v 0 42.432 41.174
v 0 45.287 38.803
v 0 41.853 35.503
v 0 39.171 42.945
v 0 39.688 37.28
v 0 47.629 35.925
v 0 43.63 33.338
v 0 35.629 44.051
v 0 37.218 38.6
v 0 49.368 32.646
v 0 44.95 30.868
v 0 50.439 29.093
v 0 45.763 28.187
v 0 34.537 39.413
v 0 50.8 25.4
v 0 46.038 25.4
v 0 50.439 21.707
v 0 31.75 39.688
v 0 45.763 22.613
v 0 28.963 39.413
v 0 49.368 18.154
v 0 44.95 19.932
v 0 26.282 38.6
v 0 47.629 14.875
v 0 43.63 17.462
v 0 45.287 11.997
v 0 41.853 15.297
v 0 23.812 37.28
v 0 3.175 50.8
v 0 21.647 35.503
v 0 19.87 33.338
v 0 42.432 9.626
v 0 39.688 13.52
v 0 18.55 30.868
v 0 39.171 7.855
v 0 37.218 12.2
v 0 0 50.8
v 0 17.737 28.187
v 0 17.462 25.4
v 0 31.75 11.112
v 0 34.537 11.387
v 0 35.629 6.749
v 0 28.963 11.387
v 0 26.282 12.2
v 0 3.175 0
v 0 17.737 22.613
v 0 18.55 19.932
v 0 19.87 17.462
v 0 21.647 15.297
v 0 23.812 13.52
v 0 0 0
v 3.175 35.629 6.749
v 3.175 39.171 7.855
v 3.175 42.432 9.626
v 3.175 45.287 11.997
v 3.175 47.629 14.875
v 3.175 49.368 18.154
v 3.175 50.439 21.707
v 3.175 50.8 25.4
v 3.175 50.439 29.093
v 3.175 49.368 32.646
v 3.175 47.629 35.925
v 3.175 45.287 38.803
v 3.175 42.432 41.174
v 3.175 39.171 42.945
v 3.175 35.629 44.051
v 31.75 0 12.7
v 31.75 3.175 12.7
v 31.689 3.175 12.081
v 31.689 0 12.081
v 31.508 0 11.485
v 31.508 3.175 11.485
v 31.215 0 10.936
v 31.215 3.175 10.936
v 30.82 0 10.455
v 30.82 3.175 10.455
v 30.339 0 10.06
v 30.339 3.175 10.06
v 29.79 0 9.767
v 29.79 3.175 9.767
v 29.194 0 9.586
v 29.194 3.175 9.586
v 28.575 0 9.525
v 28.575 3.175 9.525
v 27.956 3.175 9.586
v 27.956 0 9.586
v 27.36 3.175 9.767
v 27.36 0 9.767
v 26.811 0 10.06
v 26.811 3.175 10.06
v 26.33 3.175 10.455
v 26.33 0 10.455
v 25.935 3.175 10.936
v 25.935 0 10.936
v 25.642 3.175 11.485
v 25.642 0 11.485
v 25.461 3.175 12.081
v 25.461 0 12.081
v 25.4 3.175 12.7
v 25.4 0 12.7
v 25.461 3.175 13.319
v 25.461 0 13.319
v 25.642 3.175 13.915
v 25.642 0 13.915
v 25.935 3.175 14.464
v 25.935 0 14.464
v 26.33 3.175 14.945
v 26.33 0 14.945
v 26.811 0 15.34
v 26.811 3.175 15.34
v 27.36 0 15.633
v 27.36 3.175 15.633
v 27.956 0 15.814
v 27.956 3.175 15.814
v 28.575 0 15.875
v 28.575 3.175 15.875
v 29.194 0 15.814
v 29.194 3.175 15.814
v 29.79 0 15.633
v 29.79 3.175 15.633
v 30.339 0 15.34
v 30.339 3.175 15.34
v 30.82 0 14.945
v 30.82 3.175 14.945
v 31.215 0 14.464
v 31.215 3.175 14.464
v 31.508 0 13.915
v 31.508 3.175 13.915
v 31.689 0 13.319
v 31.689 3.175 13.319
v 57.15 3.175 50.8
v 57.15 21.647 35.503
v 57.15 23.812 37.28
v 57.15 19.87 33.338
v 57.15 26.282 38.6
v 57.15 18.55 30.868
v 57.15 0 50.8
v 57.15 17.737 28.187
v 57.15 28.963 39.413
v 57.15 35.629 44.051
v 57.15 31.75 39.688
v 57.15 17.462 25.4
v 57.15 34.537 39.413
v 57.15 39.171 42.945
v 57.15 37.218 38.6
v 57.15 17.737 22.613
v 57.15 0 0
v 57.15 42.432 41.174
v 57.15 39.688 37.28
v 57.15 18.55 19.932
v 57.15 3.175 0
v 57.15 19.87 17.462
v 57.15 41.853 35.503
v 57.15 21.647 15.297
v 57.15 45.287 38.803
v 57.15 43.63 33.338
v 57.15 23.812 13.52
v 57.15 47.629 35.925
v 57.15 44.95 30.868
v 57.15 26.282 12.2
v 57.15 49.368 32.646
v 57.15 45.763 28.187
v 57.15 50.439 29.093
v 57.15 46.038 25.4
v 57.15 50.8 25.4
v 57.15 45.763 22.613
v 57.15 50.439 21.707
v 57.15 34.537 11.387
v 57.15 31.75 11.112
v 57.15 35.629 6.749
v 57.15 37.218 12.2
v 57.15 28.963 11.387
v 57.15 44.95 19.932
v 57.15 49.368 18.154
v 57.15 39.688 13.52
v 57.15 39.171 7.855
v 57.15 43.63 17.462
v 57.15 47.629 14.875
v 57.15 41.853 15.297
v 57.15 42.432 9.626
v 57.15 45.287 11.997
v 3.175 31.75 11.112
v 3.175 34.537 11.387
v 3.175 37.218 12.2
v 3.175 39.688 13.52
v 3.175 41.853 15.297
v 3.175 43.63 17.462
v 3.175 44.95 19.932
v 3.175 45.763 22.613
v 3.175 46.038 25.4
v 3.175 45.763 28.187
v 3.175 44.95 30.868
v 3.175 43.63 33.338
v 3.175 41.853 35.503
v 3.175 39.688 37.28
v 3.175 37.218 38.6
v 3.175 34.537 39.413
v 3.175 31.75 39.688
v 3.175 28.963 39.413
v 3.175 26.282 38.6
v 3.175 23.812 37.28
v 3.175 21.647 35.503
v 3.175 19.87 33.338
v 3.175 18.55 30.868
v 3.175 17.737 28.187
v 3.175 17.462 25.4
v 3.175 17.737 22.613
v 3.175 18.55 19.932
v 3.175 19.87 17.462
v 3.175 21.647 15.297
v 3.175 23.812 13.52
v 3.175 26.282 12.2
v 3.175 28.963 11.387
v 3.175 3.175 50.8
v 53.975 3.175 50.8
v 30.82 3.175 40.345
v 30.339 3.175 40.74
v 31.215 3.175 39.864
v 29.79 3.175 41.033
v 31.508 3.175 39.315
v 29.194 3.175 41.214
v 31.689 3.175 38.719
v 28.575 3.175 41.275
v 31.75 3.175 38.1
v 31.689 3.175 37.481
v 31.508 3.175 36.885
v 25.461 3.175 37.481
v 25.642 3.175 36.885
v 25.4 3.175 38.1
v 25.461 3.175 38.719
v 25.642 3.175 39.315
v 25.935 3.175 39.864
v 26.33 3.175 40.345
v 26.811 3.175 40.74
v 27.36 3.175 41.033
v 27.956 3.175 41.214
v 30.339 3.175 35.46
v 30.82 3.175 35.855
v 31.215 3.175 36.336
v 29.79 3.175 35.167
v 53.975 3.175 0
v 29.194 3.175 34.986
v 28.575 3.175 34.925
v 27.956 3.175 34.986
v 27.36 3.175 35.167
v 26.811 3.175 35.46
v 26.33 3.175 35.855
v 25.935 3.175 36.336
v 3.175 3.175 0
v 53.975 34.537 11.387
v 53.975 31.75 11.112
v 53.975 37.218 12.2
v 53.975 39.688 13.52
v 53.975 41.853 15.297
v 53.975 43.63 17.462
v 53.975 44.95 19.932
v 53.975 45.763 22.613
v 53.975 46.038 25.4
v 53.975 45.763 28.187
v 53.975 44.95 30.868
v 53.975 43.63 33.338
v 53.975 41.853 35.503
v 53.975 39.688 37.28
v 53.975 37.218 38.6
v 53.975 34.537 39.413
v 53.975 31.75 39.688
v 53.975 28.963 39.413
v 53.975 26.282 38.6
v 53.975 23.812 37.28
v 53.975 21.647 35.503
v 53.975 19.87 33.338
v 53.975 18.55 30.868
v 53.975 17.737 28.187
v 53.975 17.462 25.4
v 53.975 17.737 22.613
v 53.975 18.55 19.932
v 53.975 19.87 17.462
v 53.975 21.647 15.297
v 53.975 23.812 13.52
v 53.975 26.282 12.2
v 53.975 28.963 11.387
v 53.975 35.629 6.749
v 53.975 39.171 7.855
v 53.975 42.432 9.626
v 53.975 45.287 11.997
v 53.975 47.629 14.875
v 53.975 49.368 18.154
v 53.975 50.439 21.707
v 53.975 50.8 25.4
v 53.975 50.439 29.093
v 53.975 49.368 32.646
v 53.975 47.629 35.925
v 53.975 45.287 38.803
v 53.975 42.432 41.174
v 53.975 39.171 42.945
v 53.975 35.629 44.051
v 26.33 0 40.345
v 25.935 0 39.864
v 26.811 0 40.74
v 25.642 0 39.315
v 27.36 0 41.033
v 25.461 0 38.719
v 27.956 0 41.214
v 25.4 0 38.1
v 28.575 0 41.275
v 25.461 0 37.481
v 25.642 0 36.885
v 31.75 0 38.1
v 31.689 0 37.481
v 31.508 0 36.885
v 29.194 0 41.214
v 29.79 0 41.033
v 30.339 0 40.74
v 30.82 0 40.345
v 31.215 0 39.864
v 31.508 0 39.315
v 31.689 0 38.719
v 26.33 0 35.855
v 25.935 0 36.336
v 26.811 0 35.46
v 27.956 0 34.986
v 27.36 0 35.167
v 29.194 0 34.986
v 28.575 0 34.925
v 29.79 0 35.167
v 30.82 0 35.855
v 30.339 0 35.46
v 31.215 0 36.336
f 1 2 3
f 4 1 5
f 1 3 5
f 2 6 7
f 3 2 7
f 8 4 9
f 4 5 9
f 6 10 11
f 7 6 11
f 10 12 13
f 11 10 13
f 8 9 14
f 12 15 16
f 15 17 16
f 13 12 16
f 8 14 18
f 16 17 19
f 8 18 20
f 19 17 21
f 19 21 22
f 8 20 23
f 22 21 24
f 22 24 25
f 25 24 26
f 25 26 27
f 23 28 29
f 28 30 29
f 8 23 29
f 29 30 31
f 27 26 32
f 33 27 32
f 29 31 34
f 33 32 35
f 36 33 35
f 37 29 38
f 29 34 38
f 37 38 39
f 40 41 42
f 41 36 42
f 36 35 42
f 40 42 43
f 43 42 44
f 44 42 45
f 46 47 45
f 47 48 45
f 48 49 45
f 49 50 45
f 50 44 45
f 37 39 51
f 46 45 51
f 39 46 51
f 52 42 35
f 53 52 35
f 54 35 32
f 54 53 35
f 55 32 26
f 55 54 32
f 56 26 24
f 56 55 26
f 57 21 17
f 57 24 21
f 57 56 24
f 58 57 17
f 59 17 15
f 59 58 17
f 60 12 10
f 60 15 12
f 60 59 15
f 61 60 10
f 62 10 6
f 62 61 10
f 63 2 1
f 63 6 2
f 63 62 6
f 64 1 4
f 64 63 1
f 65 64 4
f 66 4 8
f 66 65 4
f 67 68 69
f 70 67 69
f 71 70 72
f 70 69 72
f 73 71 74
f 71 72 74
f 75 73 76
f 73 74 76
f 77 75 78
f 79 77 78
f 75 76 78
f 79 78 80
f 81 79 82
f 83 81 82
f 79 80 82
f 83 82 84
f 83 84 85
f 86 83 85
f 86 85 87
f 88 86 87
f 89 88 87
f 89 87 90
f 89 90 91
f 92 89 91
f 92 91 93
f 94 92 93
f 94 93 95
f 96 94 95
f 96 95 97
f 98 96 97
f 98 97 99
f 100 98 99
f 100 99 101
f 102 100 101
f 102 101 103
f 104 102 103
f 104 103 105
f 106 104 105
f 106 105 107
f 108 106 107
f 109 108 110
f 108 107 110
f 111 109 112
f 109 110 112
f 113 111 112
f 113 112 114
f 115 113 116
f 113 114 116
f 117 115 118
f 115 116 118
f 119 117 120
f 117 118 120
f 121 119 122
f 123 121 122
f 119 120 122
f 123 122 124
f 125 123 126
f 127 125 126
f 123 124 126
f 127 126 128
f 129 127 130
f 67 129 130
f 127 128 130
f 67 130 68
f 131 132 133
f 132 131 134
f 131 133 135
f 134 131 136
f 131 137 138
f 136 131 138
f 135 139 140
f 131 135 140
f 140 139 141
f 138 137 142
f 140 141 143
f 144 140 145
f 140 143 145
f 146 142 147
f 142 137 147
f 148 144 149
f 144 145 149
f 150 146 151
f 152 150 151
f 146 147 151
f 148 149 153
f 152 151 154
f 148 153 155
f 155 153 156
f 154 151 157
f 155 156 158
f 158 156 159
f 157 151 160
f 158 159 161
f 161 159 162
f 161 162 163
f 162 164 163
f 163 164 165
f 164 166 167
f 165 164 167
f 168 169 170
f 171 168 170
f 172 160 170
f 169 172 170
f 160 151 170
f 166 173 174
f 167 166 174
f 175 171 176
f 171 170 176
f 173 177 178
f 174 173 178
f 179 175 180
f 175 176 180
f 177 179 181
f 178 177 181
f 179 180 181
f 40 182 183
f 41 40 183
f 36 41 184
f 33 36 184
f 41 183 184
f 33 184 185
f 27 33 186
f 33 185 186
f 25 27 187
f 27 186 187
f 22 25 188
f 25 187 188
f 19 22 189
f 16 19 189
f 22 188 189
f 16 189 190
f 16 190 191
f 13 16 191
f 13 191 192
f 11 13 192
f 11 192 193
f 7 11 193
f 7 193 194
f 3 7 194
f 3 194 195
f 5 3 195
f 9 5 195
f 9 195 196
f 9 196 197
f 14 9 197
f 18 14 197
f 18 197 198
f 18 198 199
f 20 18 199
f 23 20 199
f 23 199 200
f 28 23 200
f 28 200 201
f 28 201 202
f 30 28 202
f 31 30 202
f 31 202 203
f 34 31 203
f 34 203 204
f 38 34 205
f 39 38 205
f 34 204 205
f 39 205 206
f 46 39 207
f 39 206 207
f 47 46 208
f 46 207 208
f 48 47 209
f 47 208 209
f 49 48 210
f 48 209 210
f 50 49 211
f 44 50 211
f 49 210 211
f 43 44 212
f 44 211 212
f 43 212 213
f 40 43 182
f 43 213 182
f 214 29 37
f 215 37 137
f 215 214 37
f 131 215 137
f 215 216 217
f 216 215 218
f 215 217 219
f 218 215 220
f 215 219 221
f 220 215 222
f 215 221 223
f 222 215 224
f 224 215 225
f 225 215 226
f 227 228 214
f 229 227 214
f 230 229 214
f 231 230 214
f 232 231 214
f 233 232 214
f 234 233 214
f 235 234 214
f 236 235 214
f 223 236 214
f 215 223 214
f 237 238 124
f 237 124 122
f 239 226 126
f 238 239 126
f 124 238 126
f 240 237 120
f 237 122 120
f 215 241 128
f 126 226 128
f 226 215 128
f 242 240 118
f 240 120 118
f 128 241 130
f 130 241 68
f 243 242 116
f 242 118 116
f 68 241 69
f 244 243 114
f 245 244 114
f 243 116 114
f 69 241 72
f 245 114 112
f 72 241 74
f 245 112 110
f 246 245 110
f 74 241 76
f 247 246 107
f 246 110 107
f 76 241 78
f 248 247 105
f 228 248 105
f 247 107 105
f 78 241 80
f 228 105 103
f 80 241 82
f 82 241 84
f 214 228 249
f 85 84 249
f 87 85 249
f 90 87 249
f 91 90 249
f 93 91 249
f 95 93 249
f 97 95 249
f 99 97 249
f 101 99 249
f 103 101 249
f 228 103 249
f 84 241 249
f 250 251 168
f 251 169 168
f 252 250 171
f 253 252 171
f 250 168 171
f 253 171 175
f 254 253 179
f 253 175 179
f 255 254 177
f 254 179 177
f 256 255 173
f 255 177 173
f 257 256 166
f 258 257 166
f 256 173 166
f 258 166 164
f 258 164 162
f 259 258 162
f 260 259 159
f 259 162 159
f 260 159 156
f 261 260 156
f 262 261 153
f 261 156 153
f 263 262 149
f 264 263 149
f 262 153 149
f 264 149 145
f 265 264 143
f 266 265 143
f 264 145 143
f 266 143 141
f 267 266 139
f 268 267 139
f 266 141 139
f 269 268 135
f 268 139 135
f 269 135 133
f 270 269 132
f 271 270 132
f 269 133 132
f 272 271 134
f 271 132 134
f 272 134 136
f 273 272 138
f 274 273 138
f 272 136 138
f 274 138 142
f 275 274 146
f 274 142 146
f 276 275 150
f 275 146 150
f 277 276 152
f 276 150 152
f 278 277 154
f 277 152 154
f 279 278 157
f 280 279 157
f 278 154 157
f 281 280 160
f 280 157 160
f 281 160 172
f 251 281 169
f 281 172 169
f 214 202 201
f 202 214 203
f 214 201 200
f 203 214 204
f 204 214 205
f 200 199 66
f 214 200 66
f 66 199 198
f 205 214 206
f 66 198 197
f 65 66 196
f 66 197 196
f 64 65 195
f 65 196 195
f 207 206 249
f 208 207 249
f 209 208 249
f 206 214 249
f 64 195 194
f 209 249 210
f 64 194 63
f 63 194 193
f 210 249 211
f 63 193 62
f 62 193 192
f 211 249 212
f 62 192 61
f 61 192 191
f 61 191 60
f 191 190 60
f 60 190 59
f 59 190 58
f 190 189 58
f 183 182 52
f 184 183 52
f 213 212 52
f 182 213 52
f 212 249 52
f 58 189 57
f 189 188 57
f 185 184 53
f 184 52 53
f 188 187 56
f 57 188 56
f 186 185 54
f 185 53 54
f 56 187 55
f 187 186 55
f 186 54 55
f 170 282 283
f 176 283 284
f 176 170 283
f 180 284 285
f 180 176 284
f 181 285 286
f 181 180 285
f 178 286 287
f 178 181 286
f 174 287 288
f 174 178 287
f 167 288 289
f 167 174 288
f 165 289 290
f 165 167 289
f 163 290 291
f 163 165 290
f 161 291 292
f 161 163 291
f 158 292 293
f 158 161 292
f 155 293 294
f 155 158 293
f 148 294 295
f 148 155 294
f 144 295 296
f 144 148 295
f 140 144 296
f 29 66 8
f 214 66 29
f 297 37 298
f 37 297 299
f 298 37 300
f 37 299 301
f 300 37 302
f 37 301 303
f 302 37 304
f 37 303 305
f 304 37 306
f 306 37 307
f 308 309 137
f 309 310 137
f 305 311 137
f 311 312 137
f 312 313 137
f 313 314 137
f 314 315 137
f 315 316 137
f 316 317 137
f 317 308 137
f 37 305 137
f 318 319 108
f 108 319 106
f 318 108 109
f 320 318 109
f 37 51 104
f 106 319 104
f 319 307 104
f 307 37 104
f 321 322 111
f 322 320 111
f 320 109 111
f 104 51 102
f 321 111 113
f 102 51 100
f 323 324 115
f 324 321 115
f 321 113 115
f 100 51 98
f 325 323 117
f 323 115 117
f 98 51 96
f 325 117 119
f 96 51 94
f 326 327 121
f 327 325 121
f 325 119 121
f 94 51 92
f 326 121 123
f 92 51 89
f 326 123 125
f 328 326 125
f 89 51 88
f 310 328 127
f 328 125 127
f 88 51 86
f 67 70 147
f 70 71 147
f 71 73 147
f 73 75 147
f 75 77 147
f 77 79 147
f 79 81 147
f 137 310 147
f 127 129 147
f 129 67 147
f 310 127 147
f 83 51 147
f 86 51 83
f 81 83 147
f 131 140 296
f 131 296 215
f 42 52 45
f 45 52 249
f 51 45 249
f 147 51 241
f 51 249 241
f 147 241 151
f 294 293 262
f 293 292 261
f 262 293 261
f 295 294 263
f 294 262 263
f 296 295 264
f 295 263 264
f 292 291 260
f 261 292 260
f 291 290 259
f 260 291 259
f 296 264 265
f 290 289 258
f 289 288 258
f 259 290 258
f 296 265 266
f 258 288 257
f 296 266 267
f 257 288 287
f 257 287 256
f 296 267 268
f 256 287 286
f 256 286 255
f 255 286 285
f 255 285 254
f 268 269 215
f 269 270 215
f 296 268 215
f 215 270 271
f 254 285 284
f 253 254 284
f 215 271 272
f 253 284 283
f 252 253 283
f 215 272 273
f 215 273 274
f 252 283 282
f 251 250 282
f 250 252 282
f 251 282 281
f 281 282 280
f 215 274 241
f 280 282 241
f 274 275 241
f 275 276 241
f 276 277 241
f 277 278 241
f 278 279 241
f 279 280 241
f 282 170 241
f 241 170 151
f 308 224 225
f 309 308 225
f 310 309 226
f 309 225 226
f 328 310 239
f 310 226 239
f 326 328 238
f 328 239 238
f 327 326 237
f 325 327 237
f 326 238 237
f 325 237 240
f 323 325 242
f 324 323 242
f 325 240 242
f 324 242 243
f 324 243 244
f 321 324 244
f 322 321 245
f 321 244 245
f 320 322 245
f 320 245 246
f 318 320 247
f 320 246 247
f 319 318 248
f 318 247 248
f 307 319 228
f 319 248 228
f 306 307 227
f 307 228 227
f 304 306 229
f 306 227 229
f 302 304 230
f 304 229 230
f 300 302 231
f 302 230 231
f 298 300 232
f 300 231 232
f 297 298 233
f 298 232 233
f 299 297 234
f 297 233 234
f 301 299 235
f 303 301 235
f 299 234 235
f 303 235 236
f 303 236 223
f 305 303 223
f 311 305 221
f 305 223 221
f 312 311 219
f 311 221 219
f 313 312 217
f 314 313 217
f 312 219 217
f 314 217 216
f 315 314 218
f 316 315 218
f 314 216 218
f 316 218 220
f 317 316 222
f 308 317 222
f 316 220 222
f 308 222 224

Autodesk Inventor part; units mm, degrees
ref_plane "YZ Plane" through (0, 0, 0) normal (1, 0, 0) x (0, 1, 0)
ref_plane "XZ Plane" through (0, 0, 0) normal (0, 1, 0) x (-1, 0, 0)
ref_plane "XY Plane" through (0, 0, 0) normal (0, 0, 1) x (1, 0, 0)
sketch "Sketch1" plane through (0, 0, 0) normal (0, 0, 1) x (1, 0, 0)
  line L0 (0, 0) -> (57.15, 0)
  line L1 (57.15, 0) -> (57.15, 50.8)
  line L2 (0, 50.8) -> (0, 0)
  line L3 (53.975, 50.8) -> (53.975, 3.175)
  line L4 (53.975, 3.175) -> (3.175, 3.175)
  line L5 (3.175, 3.175) -> (3.175, 50.8)
  line L6 (0, 50.8) -> (3.175, 50.8)
  line L7 (53.975, 50.8) -> (57.15, 50.8)
  dimension "d0" = 50.8
  dimension "d1" = 57.15
  dimension "d2" = 3.175
  dimension "d3" = 3.175
  dimension "d4" = 3.175
extrude "Extrusion1" add sketch "Sketch1" along normal blind 50.8
sketch "Sketch2" plane through (57.15, 0, 0) normal (1, 0, 0) x (0, 0, -1)
  line L0 (-50.8, 50.8) -> (-50.8, 0) projected
  line L1 (0, 0) -> (0, 50.8) projected
  line L2 (0, 50.8) -> (-50.8, 50.8) projected
  line L3 (0, 3.175) -> (-50.8, 3.175) projected
  circle A0 centre (-25.4, 31.75) radius 14.2875
  arc A1 (-6.749, 35.6286) -> (-44.051, 35.6286) centre (-25.4, 31.75) ccw
  line L4 (-44.051, 35.6286) -> (-50.8, 3.175)
  line L5 (-6.749, 35.6286) -> (0, 3.175)
  dimension "d7" = 28.575
  dimension "d8" = 25.4
  dimension "d9" = 19.05
extrude "Extrusion2" cut sketch "Sketch2" against normal through all contours L2 A1 L4 L0 | L2 L1 L5 A1 | A0
sketch "Sketch3" plane through (3.175, 3.175, 50.8) normal (0, 1, 0) x (1, 0, 0)
  line L0 (0, 0) -> (50.8, 0) projected
  line L1 (50.8, 50.8) -> (50.8, 0) projected
  line L2 (50.8, 50.8) -> (0, 50.8) projected
  circle A0 centre (25.4, 38.1) radius 3.175
  circle A1 centre (25.4, 12.7) radius 3.175
  line L3 (0, 50.8) -> (0, 0) projected
  point P0 (-3.175, 50.8)
  dimension "d12" = 6.35
  dimension "d13" = 6.35
  dimension "d14" = 12.7
  dimension "d15" = 25.4
  dimension "d16" = 12.7
  dimension "d17" = 25.4
  dimension "d20" = 50.8
extrude "Extrusion3" cut sketch "Sketch3" against normal blind 50.8 contours A0 | A1
equation "\"d3\" = d2"
equation "\"d4\" = d2"
equation "\"d12\" = d13"
equation "\"d15\" = 0.5 * d20"
equation "\"d16\" = d14"
equation "\"d17\" = d15"
properties part number "shooter bearing bracket"
